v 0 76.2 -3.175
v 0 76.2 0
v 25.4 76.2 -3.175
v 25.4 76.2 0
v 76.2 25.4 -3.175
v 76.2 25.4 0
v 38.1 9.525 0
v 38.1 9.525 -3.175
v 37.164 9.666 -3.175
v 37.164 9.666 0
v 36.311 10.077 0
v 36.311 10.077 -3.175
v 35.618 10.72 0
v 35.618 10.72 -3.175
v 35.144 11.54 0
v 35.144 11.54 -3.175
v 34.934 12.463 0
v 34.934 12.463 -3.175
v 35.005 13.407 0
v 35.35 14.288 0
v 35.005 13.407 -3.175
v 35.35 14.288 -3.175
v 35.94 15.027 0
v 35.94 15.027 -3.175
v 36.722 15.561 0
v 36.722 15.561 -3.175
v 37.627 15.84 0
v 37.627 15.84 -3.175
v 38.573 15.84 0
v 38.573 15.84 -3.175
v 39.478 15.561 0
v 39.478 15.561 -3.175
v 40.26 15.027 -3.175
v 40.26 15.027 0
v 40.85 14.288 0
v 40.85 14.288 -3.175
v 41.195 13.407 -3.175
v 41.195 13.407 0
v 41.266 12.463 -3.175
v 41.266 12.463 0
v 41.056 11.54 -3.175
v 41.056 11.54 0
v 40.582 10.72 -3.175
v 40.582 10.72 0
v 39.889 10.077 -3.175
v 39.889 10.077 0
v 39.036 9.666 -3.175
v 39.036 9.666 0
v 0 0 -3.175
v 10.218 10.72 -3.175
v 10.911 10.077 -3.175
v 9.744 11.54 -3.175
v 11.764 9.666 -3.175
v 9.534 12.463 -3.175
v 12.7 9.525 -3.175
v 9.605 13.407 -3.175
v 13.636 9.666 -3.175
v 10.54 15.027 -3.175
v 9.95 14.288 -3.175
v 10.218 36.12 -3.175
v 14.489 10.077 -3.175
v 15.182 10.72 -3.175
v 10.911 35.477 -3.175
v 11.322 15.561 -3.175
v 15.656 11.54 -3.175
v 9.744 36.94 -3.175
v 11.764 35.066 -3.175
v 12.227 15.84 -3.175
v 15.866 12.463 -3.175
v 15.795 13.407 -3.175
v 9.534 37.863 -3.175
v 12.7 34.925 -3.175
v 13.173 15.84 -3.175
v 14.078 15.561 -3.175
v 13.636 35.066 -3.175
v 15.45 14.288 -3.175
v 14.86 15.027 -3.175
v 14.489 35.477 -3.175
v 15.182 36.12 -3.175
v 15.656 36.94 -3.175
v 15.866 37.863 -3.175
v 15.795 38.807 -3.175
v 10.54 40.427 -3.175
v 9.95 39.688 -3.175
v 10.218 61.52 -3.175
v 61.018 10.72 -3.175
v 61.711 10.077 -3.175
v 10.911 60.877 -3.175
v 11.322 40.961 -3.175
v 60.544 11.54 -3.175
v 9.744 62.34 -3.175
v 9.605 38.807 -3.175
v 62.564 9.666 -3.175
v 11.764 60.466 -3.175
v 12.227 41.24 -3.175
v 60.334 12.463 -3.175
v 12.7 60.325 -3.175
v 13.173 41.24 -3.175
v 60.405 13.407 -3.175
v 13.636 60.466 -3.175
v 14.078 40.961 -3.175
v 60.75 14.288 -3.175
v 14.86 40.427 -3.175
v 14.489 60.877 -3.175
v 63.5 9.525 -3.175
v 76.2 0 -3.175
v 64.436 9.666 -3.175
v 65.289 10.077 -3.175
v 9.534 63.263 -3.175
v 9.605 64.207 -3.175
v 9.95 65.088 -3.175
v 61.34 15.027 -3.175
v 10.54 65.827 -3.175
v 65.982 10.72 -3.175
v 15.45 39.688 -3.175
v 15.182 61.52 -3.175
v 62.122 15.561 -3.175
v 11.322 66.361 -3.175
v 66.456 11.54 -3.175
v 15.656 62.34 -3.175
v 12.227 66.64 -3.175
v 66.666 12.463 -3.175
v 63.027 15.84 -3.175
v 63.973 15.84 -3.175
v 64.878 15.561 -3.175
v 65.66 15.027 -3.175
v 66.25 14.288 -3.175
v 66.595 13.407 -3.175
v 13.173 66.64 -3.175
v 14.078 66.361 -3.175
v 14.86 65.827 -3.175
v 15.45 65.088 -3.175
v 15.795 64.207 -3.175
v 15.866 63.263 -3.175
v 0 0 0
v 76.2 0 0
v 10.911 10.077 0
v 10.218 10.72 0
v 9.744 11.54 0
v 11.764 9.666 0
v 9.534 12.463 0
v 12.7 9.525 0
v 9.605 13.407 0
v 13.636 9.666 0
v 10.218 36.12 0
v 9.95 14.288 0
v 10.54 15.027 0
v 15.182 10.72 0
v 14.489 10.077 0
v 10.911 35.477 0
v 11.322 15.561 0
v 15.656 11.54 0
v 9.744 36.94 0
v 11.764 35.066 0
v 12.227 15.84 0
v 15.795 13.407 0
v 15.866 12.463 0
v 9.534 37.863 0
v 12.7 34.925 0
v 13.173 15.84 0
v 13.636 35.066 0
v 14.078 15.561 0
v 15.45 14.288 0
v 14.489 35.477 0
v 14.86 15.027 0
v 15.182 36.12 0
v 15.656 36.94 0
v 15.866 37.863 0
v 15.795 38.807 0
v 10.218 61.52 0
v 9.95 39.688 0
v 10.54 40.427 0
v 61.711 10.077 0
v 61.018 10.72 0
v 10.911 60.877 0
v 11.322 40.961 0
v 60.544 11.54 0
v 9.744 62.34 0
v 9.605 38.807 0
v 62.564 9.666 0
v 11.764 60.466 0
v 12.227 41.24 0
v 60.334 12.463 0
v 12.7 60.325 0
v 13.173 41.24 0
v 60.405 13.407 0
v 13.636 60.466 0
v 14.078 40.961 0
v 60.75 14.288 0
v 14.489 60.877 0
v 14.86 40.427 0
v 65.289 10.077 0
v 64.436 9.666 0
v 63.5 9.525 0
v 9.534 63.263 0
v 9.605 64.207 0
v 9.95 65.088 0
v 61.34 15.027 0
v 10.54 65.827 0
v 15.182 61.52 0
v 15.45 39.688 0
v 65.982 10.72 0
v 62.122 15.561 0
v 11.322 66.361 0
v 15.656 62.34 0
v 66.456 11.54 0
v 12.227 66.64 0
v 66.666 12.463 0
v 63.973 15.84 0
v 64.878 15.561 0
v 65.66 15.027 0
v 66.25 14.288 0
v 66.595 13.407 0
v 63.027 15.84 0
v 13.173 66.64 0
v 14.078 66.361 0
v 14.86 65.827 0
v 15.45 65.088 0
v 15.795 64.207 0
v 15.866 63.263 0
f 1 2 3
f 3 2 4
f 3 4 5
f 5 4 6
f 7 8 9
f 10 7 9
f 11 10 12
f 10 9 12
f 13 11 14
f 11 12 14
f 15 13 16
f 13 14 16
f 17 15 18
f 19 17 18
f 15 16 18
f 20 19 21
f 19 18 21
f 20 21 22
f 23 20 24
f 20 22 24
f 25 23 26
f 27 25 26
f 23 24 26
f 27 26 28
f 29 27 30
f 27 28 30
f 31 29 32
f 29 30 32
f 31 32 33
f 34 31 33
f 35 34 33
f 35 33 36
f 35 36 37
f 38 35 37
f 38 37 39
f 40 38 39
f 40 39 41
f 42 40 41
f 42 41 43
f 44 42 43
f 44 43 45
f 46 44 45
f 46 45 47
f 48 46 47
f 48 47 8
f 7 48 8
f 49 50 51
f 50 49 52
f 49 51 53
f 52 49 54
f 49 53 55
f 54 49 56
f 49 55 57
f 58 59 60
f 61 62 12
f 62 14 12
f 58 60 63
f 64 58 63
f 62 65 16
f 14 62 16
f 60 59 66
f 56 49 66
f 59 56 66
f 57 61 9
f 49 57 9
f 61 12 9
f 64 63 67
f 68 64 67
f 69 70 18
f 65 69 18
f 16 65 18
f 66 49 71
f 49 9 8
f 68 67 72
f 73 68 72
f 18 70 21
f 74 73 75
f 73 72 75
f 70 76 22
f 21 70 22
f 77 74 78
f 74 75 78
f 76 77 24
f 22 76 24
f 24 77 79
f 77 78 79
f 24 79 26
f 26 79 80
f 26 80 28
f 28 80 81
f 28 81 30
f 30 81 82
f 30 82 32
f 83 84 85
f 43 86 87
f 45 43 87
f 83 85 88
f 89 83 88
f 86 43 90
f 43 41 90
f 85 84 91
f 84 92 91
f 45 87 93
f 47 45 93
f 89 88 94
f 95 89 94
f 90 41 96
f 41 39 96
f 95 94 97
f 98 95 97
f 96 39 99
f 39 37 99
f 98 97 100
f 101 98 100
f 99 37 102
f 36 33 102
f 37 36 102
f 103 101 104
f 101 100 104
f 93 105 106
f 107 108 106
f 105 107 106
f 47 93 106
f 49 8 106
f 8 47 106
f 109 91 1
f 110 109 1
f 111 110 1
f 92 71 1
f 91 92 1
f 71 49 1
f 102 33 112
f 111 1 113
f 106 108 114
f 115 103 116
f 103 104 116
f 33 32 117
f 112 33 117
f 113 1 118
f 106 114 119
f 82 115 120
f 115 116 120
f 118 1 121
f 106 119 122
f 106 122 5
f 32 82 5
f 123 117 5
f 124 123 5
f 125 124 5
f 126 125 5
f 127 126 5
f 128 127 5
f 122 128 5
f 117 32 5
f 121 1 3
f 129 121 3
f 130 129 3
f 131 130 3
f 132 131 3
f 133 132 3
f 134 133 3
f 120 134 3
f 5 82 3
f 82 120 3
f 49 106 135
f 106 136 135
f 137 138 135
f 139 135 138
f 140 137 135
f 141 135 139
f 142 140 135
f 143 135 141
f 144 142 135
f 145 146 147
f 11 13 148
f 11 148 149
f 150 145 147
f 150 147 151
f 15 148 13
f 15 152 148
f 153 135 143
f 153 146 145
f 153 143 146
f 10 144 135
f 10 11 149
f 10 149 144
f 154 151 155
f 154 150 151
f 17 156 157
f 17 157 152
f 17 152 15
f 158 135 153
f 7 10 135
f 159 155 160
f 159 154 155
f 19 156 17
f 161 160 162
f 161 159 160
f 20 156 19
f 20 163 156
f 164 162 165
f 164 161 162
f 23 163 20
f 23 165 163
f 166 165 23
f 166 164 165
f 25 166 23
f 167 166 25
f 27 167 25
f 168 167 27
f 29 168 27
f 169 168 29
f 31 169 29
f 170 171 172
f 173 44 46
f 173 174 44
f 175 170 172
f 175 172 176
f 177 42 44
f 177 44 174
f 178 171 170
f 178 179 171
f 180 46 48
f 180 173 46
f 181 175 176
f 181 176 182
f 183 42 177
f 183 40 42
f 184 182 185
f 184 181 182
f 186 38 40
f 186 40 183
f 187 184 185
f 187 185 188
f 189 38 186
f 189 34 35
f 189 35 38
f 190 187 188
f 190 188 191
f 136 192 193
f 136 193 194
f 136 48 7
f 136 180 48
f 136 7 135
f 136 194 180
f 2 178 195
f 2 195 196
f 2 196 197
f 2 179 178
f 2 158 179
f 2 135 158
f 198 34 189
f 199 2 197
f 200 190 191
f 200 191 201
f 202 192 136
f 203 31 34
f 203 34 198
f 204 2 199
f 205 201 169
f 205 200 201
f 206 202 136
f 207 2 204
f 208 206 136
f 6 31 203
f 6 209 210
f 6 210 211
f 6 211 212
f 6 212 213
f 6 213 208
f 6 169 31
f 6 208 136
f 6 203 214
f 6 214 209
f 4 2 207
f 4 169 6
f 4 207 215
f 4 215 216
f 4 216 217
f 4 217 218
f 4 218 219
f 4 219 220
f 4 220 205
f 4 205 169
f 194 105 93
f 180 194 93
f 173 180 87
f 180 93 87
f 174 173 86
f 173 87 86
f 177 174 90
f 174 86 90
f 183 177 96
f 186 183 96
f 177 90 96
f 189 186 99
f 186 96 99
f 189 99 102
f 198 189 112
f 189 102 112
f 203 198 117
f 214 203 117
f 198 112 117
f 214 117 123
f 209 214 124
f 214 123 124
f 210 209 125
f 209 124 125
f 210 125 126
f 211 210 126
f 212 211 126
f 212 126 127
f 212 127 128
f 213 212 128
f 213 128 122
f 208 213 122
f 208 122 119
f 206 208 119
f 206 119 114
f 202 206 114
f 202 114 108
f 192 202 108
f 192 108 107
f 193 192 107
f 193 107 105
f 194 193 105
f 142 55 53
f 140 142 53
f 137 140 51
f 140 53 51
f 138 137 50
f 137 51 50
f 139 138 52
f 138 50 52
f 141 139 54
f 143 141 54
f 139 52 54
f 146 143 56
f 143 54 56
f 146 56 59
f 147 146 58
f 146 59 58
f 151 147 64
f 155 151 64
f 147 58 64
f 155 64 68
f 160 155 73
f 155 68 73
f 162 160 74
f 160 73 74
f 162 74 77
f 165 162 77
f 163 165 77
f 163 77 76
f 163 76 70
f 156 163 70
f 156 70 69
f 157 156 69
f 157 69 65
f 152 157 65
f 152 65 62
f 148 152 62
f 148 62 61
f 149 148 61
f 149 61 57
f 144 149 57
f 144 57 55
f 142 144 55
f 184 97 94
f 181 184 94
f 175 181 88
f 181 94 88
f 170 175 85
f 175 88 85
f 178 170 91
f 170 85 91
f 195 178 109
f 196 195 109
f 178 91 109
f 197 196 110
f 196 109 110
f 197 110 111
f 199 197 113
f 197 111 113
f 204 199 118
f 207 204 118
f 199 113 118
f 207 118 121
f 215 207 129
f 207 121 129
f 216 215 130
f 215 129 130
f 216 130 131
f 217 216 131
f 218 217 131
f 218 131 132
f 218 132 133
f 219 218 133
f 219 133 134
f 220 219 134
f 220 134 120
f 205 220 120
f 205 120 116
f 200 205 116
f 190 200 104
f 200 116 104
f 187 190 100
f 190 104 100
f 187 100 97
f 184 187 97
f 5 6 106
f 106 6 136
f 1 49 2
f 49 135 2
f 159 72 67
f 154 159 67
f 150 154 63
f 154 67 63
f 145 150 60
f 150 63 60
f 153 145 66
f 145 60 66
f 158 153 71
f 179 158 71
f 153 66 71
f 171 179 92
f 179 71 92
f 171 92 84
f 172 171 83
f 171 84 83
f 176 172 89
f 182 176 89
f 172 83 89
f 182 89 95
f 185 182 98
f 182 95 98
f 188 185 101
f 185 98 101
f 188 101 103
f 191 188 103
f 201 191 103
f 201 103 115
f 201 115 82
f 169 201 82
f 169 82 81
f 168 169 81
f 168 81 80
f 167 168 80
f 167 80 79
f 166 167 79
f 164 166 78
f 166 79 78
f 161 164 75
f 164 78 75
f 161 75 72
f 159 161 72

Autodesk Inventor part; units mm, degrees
ref_plane "YZ Plane" through (0, 0, 0) normal (1, 0, 0) x (0, 1, 0)
ref_plane "XZ Plane" through (0, 0, 0) normal (0, 1, 0) x (-1, 0, 0)
ref_plane "XY Plane" through (0, 0, 0) normal (0, 0, 1) x (1, 0, 0)
sketch "Sketch1" plane through (0, 0, 0) normal (0, 0, 1) x (1, 0, 0)
  line L0 (0, 0) -> (0, 76.2)
  line L1 (0, 76.2) -> (25.4, 76.2)
  line L2 (25.4, 76.2) -> (76.2, 25.4)
  line L3 (76.2, 25.4) -> (76.2, 0)
  line L4 (76.2, 0) -> (0, 0)
  point P0 (12.7, 63.5)
  point P1 (12.7, 38.1)
  point P2 (12.7, 12.7)
  point P3 (38.1, 12.7)
  point P4 (63.5, 12.7)
  dimension "d0" = 76.2
  dimension "d1" = 76.2
  dimension "d2" = 25.4
  dimension "d3" = 25.4
  dimension "d4" = 12.7
  dimension "d5" = 12.7
  dimension "d6" = 25.4
  dimension "d7" = 25.4
  dimension "d8" = 25.4
  dimension "d9" = 25.4
extrude "Extrusion1" add sketch "Sketch1" against normal blind 3.175
hole "Hole1" at (12.7, 63.5, 0) at (12.7, 38.1, 0) at (12.7, 12.7, 0) at (38.1, 12.7, 0) at (63.5, 12.7, 0) direction (0, 0, -1) diameter 6.35 depth 25.4 tip angle 118
properties part number "common angle bracket"
